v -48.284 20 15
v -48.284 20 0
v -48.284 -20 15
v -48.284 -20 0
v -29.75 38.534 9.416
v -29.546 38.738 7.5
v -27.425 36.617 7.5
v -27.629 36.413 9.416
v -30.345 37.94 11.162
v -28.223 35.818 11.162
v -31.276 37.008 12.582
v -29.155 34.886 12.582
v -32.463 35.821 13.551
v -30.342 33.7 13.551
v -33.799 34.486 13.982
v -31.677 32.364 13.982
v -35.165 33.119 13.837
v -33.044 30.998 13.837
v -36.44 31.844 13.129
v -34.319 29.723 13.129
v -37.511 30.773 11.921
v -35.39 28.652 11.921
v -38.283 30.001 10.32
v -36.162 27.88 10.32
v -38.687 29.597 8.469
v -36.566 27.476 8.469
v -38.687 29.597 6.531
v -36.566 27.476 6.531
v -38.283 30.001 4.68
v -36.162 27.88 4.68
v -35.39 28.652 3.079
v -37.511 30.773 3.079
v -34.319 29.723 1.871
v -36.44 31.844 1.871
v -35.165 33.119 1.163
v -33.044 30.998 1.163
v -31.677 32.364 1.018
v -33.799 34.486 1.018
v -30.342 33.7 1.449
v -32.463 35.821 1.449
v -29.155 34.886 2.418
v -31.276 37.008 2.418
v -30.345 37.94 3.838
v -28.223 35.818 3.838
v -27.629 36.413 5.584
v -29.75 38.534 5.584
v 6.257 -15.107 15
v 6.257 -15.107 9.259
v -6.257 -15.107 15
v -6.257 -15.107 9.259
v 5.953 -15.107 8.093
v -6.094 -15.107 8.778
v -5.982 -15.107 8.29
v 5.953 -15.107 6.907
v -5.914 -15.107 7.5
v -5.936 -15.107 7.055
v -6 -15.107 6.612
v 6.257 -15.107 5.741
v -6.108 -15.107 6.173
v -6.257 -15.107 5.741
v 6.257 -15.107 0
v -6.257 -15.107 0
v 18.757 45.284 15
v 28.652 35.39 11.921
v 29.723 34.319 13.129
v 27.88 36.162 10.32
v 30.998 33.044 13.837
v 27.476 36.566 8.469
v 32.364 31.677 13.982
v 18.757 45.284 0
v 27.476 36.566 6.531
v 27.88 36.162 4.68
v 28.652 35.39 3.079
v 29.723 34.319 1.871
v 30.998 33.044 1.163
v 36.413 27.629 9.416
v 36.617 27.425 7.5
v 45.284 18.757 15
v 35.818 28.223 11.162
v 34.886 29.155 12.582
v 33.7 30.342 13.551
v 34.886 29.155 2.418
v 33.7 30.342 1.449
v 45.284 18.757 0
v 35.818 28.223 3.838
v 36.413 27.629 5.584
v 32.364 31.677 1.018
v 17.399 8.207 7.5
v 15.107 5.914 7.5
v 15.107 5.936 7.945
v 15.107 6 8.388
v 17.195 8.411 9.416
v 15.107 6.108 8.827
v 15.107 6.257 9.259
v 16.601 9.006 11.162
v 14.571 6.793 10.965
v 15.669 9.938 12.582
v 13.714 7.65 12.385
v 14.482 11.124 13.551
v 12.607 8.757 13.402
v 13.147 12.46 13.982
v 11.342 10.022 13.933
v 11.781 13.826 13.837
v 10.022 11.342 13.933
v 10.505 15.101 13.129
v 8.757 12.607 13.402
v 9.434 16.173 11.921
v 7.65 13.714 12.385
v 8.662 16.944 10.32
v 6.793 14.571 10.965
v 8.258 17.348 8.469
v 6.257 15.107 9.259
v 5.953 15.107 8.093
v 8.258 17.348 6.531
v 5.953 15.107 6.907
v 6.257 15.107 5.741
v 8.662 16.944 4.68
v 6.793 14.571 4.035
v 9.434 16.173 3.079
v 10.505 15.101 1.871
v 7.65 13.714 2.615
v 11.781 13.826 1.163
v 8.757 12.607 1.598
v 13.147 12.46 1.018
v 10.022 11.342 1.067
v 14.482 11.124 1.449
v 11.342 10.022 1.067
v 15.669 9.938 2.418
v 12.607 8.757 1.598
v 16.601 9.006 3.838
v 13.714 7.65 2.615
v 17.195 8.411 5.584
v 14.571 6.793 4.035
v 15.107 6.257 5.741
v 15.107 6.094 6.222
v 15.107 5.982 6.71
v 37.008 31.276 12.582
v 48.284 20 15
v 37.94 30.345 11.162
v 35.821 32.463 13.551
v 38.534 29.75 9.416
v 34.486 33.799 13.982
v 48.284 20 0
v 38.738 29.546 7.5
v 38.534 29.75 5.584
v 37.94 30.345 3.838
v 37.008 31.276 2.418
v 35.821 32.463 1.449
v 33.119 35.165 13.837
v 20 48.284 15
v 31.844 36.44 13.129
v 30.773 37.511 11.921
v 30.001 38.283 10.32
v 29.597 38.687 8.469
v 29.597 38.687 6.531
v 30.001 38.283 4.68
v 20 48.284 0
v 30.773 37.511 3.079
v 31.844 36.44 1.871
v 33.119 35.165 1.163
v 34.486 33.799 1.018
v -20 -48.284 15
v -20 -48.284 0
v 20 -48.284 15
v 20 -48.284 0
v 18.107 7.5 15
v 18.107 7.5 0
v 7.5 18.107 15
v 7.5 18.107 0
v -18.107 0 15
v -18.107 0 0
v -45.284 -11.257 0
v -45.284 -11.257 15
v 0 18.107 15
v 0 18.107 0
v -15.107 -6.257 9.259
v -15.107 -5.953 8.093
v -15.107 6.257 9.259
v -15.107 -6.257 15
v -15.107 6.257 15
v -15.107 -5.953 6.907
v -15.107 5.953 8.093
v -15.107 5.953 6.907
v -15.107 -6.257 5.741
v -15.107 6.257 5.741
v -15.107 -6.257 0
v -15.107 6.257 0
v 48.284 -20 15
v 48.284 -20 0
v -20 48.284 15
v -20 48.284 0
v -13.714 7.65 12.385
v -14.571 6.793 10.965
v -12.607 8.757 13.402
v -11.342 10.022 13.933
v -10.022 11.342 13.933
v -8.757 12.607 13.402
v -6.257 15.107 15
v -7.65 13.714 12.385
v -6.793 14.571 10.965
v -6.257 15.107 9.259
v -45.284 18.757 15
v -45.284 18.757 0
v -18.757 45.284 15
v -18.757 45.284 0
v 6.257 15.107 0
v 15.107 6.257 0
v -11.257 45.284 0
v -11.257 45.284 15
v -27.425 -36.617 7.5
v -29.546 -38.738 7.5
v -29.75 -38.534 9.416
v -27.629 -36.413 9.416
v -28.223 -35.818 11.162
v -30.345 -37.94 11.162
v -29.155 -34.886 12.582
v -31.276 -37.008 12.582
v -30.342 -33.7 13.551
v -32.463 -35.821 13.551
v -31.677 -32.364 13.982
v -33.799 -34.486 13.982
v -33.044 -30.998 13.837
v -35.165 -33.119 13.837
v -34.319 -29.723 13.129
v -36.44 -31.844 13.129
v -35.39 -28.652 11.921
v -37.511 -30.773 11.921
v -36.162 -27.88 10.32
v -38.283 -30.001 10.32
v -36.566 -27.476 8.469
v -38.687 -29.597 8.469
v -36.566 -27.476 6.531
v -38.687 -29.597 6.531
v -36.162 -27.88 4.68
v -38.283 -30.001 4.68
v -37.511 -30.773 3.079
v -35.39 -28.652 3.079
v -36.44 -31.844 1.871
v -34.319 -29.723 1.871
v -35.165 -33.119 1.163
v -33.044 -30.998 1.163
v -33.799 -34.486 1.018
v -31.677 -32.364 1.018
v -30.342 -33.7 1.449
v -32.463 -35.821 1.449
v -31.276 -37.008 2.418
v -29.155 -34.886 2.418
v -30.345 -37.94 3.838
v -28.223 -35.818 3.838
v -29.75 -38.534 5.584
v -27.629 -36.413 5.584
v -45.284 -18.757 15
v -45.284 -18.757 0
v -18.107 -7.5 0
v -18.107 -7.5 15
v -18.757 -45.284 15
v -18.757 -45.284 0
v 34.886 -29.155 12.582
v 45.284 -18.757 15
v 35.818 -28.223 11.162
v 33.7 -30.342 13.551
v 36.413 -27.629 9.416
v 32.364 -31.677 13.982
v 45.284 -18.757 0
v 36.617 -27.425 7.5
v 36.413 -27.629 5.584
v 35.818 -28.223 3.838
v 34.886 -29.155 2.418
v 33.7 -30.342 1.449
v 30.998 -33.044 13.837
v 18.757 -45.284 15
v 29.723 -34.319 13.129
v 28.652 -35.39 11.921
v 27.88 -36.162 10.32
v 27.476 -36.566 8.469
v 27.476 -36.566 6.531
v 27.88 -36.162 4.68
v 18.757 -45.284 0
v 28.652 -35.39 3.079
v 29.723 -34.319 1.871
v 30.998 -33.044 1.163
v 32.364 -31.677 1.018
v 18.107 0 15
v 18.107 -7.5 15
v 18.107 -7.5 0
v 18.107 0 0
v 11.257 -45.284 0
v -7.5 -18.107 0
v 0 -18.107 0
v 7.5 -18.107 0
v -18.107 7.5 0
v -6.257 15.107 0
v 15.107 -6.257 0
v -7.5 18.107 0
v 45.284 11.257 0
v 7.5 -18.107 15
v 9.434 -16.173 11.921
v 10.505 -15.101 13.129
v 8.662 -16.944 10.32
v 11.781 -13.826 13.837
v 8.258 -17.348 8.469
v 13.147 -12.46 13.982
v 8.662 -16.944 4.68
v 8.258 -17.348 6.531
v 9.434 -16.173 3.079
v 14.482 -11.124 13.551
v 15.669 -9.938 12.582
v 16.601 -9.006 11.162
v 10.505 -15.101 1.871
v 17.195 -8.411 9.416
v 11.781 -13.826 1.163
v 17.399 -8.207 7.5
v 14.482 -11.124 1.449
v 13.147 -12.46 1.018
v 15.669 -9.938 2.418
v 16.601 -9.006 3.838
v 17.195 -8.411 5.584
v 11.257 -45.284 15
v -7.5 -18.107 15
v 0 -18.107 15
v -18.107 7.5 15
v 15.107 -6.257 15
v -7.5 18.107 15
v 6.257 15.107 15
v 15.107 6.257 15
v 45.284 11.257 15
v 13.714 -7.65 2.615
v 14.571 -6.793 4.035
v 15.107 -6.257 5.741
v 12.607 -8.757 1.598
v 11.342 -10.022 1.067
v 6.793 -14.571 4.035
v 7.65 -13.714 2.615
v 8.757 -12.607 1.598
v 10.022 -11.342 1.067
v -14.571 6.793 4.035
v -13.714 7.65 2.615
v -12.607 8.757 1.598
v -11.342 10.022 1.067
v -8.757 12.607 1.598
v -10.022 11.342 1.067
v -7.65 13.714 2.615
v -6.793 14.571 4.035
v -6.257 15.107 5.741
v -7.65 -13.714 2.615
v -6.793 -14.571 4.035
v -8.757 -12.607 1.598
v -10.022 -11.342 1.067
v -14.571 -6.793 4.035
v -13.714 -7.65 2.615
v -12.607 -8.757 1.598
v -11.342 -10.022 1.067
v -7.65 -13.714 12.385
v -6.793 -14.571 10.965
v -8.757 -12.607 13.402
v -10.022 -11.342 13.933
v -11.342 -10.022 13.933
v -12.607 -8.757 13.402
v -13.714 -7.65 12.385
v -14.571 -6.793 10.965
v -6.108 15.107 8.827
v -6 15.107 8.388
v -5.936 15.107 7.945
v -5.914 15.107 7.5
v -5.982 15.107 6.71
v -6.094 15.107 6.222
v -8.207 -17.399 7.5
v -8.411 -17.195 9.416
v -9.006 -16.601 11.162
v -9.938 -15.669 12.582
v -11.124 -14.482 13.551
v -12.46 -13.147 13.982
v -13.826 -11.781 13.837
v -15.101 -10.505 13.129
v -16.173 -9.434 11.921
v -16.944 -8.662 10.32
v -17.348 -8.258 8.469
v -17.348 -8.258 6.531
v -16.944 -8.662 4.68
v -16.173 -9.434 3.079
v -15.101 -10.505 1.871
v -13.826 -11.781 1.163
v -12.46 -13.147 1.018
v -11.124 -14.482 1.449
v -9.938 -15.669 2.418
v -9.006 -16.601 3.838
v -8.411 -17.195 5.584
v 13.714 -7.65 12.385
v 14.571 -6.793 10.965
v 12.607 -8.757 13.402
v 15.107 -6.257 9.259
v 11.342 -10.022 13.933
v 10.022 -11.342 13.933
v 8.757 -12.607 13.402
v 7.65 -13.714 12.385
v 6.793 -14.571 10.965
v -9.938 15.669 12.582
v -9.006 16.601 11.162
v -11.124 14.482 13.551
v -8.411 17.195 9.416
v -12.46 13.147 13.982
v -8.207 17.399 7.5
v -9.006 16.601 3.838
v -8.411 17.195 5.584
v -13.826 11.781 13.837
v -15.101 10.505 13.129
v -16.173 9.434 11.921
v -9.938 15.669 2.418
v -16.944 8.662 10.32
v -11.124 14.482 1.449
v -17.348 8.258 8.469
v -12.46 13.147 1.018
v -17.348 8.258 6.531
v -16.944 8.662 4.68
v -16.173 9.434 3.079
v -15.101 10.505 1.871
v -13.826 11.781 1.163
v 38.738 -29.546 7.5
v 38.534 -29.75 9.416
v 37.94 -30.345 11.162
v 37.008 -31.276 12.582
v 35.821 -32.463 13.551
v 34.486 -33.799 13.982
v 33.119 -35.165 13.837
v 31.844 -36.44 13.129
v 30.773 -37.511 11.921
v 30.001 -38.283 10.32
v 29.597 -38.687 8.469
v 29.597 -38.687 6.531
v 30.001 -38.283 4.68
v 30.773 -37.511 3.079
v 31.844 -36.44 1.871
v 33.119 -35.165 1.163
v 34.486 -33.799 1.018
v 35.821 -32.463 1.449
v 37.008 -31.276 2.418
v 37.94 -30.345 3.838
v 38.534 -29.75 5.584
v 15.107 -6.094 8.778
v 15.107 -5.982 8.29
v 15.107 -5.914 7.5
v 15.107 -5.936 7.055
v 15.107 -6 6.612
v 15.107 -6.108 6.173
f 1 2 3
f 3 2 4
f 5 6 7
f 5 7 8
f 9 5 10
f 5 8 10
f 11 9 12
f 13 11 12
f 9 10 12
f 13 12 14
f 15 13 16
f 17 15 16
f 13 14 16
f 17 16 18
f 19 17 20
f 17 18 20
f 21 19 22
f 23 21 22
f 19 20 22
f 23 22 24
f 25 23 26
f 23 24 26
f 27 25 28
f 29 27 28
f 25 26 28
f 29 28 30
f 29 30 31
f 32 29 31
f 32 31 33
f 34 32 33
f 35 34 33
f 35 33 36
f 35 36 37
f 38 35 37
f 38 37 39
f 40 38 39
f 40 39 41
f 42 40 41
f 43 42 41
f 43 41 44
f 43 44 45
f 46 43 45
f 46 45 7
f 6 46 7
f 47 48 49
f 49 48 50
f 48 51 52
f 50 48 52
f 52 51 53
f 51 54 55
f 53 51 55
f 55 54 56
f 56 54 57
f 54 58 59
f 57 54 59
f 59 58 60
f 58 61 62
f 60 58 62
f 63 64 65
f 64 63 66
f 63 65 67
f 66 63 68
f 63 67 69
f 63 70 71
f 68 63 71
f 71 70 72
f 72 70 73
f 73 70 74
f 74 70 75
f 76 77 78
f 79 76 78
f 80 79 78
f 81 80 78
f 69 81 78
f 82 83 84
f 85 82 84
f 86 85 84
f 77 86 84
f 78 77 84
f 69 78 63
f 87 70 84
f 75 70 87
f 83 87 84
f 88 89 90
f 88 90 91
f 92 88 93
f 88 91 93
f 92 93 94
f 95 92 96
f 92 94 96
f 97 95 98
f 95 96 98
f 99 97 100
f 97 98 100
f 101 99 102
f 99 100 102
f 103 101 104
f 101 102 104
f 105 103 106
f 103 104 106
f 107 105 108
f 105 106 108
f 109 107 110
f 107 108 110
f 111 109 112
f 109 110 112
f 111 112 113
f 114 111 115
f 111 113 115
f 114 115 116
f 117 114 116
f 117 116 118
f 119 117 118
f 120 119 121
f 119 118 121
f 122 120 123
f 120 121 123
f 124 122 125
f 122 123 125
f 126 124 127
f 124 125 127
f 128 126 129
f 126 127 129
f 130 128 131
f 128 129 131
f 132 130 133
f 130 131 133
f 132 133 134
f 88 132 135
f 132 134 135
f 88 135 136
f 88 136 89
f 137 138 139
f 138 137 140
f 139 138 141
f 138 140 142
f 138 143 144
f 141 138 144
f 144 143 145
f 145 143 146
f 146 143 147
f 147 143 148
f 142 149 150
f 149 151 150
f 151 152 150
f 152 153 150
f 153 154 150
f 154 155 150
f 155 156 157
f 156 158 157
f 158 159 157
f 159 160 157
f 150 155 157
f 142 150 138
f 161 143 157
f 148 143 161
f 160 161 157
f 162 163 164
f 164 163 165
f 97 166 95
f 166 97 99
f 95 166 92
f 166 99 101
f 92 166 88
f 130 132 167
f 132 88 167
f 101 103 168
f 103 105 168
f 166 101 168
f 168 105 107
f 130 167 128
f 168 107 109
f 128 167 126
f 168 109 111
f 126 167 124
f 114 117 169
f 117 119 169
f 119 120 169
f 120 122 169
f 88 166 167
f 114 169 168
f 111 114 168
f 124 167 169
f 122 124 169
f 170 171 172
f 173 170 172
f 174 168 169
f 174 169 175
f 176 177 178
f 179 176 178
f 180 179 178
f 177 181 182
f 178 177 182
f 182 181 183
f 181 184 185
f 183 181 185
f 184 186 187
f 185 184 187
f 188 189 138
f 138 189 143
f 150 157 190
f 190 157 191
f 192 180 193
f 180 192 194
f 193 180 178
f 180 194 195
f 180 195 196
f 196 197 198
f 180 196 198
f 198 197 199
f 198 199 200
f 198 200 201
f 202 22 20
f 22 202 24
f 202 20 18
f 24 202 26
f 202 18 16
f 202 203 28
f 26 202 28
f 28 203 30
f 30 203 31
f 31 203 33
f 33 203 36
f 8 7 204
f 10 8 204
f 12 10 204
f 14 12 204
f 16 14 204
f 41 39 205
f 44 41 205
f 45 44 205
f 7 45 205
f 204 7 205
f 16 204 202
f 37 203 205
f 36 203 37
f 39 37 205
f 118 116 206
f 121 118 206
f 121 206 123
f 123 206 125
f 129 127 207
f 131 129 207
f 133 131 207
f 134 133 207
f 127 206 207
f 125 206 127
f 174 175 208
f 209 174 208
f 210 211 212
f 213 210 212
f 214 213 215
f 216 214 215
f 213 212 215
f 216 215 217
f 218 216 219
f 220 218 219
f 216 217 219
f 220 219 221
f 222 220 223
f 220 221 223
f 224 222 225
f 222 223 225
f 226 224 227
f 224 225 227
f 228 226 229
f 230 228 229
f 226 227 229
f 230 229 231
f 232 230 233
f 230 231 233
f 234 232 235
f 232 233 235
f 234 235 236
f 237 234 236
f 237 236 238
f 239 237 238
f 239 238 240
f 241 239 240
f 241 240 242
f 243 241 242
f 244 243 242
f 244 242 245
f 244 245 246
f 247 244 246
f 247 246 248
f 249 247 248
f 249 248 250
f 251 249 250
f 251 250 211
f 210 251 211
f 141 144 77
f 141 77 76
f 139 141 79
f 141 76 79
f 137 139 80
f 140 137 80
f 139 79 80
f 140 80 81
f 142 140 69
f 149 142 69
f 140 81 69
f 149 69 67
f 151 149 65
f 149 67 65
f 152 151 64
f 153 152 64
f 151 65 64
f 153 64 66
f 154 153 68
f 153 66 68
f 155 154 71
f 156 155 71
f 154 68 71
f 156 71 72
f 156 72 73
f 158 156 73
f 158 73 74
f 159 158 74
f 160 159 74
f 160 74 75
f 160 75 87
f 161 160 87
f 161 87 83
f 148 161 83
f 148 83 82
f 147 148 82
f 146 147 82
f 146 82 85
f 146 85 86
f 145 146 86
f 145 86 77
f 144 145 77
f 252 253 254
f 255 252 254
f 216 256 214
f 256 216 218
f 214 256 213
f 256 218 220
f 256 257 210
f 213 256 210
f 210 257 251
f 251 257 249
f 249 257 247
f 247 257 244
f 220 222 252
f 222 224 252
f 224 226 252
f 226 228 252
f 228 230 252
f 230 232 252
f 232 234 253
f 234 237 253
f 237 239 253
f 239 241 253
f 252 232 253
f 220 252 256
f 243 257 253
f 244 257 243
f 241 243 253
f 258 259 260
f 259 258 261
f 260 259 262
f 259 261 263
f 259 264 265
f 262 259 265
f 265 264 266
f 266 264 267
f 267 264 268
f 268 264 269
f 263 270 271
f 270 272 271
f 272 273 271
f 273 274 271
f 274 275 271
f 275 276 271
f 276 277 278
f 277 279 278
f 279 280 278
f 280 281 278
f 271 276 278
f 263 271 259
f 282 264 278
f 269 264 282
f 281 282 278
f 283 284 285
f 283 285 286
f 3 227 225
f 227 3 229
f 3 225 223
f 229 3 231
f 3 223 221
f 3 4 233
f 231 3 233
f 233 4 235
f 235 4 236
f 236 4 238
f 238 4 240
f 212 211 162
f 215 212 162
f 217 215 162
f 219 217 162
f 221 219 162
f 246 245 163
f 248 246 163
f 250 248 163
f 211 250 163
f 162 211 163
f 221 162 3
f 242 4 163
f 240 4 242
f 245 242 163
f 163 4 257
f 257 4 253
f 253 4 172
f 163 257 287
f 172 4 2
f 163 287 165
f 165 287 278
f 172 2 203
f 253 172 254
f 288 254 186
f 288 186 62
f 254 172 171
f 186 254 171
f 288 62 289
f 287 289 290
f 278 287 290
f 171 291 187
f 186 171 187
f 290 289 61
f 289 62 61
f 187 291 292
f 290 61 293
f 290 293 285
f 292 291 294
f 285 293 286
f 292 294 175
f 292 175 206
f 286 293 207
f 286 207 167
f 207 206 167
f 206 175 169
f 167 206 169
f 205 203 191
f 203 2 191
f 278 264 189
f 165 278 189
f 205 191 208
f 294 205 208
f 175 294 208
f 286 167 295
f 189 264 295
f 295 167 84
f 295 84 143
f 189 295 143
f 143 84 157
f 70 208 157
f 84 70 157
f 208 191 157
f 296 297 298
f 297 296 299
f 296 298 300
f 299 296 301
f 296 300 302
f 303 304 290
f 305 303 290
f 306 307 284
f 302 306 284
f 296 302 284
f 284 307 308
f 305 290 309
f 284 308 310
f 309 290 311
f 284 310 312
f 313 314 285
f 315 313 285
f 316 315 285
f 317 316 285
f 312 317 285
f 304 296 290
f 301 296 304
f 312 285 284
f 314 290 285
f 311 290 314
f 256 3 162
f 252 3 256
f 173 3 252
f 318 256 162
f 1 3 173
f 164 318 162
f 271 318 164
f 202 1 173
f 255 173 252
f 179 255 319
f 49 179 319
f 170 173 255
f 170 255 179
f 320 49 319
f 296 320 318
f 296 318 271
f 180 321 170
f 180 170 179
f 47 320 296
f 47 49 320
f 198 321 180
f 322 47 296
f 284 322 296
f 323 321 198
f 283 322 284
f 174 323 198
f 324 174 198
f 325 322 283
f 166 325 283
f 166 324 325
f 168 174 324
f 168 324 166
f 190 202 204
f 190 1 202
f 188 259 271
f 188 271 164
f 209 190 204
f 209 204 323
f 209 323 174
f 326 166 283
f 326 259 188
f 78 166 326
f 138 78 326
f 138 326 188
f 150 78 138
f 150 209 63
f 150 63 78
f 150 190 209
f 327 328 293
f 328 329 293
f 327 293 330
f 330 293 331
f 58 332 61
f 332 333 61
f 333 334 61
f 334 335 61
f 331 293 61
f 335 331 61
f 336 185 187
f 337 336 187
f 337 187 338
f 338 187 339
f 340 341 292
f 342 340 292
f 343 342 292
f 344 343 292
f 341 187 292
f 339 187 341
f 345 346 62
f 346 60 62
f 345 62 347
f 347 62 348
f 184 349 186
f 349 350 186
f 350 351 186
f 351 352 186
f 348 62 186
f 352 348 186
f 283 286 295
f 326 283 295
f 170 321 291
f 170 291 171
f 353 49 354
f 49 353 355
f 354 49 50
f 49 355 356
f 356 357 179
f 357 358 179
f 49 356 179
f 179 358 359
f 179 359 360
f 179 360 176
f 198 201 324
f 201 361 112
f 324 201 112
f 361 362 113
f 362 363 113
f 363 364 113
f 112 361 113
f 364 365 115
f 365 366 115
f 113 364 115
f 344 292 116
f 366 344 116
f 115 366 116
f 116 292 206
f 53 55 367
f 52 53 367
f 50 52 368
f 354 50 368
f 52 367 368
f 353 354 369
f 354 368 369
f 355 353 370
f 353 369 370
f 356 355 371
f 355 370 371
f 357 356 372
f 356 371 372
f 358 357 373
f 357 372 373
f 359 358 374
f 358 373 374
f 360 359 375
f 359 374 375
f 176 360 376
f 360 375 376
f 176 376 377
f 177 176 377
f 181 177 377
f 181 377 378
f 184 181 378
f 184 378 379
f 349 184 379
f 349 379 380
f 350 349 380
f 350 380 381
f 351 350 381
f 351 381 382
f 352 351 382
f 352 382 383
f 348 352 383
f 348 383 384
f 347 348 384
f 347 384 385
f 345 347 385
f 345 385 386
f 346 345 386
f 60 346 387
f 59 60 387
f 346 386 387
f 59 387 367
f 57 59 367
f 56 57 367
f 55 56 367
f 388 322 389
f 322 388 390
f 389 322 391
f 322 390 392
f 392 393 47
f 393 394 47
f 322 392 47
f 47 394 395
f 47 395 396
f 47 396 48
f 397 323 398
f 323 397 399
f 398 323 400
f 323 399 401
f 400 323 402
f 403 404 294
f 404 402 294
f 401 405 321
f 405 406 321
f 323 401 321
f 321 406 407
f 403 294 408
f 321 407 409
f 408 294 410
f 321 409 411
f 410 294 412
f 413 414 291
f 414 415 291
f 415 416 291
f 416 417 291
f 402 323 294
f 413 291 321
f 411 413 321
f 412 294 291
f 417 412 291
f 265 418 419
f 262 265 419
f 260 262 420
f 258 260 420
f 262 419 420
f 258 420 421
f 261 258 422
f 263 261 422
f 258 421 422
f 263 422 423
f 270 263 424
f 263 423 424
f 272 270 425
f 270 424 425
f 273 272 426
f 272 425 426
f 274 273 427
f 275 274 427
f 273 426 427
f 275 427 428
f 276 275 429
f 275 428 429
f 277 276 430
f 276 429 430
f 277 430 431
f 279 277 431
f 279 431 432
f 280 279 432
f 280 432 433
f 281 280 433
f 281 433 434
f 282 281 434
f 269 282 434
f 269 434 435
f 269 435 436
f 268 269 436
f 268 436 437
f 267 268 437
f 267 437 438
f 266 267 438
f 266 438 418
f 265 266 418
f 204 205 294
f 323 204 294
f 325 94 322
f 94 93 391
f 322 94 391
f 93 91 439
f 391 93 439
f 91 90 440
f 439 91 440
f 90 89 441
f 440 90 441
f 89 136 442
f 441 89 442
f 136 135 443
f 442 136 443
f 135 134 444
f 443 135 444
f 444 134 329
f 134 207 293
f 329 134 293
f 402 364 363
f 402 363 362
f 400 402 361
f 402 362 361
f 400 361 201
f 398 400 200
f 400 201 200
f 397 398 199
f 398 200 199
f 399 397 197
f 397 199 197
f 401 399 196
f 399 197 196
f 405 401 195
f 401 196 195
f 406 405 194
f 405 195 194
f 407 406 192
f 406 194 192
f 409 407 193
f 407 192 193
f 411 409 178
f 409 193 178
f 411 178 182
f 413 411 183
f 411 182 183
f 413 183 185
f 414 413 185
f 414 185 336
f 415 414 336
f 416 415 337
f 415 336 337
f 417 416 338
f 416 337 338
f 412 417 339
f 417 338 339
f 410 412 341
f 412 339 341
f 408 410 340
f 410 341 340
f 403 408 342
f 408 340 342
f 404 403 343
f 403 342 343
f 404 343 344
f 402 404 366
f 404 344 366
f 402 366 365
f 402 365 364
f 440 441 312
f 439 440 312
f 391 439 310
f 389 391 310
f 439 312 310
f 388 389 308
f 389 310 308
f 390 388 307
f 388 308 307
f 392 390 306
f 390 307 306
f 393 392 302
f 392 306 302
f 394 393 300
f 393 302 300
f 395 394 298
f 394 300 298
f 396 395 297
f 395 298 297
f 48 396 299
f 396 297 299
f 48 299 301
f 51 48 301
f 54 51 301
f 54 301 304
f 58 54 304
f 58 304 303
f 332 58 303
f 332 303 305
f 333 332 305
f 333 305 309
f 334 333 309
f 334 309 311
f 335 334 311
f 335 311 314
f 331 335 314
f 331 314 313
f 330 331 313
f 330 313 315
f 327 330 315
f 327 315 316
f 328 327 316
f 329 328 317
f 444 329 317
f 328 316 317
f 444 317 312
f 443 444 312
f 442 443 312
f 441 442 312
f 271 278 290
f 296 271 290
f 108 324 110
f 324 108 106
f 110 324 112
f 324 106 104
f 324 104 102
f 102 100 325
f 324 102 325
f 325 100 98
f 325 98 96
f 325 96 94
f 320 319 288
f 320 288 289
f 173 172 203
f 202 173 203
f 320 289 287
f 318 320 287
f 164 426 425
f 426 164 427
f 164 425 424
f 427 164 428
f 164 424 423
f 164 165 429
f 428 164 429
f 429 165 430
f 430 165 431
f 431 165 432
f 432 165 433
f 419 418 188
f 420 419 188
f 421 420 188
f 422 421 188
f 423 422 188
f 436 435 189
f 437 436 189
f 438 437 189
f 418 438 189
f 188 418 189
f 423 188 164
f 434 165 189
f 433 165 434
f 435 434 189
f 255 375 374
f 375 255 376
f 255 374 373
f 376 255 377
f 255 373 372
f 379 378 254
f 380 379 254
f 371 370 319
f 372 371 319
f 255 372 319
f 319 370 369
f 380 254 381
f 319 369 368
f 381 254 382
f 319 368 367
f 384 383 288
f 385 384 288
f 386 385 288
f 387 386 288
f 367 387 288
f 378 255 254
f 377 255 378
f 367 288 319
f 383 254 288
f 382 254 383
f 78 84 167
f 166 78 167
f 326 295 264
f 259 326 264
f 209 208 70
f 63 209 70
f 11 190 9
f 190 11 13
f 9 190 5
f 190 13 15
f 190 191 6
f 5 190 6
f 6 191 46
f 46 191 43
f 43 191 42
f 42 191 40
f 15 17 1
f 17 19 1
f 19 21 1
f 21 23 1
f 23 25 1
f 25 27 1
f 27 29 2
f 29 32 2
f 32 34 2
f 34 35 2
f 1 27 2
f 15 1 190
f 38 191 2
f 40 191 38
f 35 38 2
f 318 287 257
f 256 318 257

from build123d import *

# Parameters (mm, degrees)
F1_DEPTH = 15
F2_R     = 6.5
F3_DEPTH = 116.569542
F4_R     = 6.5
F5_DEPTH = 116.569542


with BuildPart() as f1:
    # F0 (on Top) → F1 (new body)
    with BuildSketch(Plane.XY):
        Polygon((-48.284271, 20), (-48.284271, -20), (-20, -48.284271), (20, -48.284271), (48.284271, -20), (48.284271, 20), (20, 48.284271), (-20, 48.284271), align=None)
        Polygon((-18.757359, -45.284271), (-45.284271, -18.757359), (-45.284271, -11.257359), (-45.284271, 18.757359), (-18.757359, 45.284271), (-11.257359, 45.284271), (18.757359, 45.284271), (45.284271, 18.757359), (45.284271, 11.257359), (45.284271, -18.757359), (18.757359, -45.284271), (11.257359, -45.284271), align=None, mode=Mode.SUBTRACT)
        Polygon((-18.106602, 0), (-18.106602, -7.5), (-7.5, -18.106602), (0, -18.106602), (7.5, -18.106602), (18.106602, -7.5), (18.106602, 0), (18.106602, 7.5), (7.5, 18.106602), (0, 18.106602), (-7.5, 18.106602), (-18.106602, 7.5), align=None)
        Polygon((-6.257359, -15.106602), (-15.106602, -6.257359), (-15.106602, 6.257359), (-6.257359, 15.106602), (6.257359, 15.106602), (15.106602, 6.257359), (15.106602, -6.257359), (6.257359, -15.106602), align=None, mode=Mode.SUBTRACT)
        Polygon((-45.284271, -11.257359), (-45.284271, -18.757359), (-18.106602, -7.5), (-18.106602, 0), align=None)
        Polygon((-11.257359, 45.284271), (-18.757359, 45.284271), (-7.5, 18.106602), (0, 18.106602), align=None)
        Polygon((18.106602, 0), (45.284271, 11.257359), (45.284271, 18.757359), (18.106602, 7.5), align=None)
        Polygon((0, -18.106602), (11.257359, -45.284271), (18.757359, -45.284271), (7.5, -18.106602), align=None)
    extrude(amount=F1_DEPTH)

    # F2 (on face) → F3 (cut, through all)
    with BuildSketch(Plane(origin=(34.142136, -34.142136, 0), x_dir=(0.707107, 0.707107, 0), z_dir=(0.707107, -0.707107, 0))):
        with Locations((0, 7.5)):
            Circle(F2_R)
    extrude(amount=-F3_DEPTH, mode=Mode.SUBTRACT)

    # F4 (on face) → F5 (cut, through all)
    with BuildSketch(Plane(origin=(-34.142136, -34.142136, 0), x_dir=(0.707107, -0.707107, 0), z_dir=(-0.707107, -0.707107, 0))):
        with Locations((0, 7.5)):
            Circle(F4_R)
    extrude(amount=-F5_DEPTH, mode=Mode.SUBTRACT)


solid = f1.part
